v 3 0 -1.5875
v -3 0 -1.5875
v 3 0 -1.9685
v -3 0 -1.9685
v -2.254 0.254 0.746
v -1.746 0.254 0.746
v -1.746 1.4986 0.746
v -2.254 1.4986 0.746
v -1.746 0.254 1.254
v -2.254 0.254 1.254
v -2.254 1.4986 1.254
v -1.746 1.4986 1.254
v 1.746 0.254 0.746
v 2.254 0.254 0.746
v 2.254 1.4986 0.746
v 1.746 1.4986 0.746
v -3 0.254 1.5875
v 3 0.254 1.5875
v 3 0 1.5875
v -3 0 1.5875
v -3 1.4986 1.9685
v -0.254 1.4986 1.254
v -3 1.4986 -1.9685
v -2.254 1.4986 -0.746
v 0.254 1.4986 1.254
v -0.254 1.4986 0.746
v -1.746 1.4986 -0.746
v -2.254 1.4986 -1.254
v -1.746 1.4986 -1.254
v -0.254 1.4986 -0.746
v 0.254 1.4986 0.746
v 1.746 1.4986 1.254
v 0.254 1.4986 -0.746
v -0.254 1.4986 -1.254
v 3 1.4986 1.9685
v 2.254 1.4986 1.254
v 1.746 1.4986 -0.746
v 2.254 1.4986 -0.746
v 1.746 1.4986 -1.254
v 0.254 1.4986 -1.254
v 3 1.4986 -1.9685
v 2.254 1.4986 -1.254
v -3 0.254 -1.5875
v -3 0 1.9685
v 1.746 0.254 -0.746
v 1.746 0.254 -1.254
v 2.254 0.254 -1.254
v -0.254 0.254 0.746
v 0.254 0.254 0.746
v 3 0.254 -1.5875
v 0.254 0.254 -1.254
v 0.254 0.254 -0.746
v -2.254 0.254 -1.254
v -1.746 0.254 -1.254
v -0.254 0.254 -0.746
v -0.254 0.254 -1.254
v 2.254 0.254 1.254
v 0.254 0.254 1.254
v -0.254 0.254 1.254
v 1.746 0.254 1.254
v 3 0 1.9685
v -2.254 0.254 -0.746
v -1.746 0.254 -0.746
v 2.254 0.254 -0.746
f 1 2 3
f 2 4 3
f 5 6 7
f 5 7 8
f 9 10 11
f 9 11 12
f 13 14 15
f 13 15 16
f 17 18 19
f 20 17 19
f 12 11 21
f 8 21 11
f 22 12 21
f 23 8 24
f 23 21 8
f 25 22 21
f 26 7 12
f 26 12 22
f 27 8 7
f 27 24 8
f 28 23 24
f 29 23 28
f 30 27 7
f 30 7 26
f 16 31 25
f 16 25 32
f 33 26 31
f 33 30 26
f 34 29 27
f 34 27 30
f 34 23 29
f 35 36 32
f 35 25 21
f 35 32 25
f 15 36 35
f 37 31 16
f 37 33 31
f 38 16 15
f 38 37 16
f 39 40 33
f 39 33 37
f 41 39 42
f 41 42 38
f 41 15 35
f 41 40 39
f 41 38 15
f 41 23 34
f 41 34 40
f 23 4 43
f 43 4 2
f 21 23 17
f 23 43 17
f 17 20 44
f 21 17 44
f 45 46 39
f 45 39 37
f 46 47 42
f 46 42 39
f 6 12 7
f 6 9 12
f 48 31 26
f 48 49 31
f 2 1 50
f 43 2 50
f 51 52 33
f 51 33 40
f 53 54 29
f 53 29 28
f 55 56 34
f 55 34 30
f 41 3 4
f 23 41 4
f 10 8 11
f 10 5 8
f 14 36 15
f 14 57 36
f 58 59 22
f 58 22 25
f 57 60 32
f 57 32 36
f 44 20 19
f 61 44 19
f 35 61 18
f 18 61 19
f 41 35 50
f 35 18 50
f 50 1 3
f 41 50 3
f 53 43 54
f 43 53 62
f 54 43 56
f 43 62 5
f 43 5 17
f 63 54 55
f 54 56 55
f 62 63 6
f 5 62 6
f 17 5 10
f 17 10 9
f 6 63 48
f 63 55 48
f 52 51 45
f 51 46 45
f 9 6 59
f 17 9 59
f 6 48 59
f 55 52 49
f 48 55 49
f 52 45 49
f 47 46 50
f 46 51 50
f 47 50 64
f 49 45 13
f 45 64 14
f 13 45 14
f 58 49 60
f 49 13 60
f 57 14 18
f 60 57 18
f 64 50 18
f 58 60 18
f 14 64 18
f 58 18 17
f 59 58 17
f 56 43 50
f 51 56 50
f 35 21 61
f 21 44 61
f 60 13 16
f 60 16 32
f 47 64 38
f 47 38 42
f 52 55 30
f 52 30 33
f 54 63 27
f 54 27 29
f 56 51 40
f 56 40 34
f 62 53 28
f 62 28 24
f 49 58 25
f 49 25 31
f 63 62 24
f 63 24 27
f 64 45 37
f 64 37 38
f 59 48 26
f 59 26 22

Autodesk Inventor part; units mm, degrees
sketch "Sketch0" plane through (0, 0, 0) normal (0, 1, 0) x (1, 0, 0)
  line L0 (-3, -1.9685) -> (3, -1.9685)
  line L1 (3, -1.9685) -> (3, 1.9685)
  line L2 (3, 1.9685) -> (-3, 1.9685)
  line L3 (-3, 1.9685) -> (-3, -1.9685)
  line L4 (1.746, 0.746) -> (2.254, 0.746)
  line L5 (2.254, 0.746) -> (2.254, 1.254)
  line L6 (2.254, 1.254) -> (1.746, 1.254)
  line L7 (1.746, 1.254) -> (1.746, 0.746)
  line L8 (1.746, -1.254) -> (2.254, -1.254)
  line L9 (2.254, -1.254) -> (2.254, -0.746)
  line L10 (2.254, -0.746) -> (1.746, -0.746)
  line L11 (1.746, -0.746) -> (1.746, -1.254)
  line L12 (-0.254, 0.746) -> (0.254, 0.746)
  line L13 (0.254, 0.746) -> (0.254, 1.254)
  line L14 (0.254, 1.254) -> (-0.254, 1.254)
  line L15 (-0.254, 1.254) -> (-0.254, 0.746)
  line L16 (-0.254, -1.254) -> (0.254, -1.254)
  line L17 (0.254, -1.254) -> (0.254, -0.746)
  line L18 (0.254, -0.746) -> (-0.254, -0.746)
  line L19 (-0.254, -0.746) -> (-0.254, -1.254)
  line L20 (-2.254, 0.746) -> (-1.746, 0.746)
  line L21 (-1.746, 0.746) -> (-1.746, 1.254)
  line L22 (-1.746, 1.254) -> (-2.254, 1.254)
  line L23 (-2.254, 1.254) -> (-2.254, 0.746)
  line L24 (-2.254, -1.254) -> (-1.746, -1.254)
  line L25 (-1.746, -1.254) -> (-1.746, -0.746)
  line L26 (-1.746, -0.746) -> (-2.254, -0.746)
  line L27 (-2.254, -0.746) -> (-2.254, -1.254)
extrude "Extrusion1" add sketch "Sketch0" along normal blind 1.4986
sketch "Sketch1" plane through (3, 0, 0) normal (1, 0, 0) x (0, 0, -1)
  line L0 (-1.5875, 0.254) -> (-1.5875, 0)
  line L1 (-1.5875, 0) -> (1.5875, 0)
  line L2 (1.5875, 0) -> (1.5875, 0.254)
  line L3 (1.5875, 0.254) -> (-1.5875, 0.254)
extrude "Extrusion2" cut sketch "Sketch1" against normal blind 6
ref_plane "0_XY" through (0, 0, 0) normal (0, 1, 0) x (1, 0, 0)
ref_plane "0_YZ" through (0, 0, 0) normal (1, 0, 0) x (0, 0, -1)
ref_plane "0_ZX" through (0, 0, 0) normal (0, 0, -1) x (0, 1, 0)
properties part number "TMM-103-05-F-D_body"
